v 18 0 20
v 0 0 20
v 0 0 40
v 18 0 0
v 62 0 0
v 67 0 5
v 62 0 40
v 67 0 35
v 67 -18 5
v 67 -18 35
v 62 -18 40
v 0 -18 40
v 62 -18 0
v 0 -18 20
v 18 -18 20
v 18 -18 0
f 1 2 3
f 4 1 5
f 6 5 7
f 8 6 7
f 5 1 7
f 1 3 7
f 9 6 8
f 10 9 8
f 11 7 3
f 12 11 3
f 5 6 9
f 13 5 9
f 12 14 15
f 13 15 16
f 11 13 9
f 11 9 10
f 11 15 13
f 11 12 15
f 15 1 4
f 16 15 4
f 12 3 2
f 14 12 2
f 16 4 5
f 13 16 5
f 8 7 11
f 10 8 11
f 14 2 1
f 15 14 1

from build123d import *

# Parameters (mm, degrees)
F1_DEPTH = 18
F2_SIZE  = 5


with BuildPart() as f1:
    # F0 (on Front) → F1 (new body)
    with BuildSketch(Plane.XZ):
        Polygon((18, 20), (18, 0), (67, 0), (67, 40), (0, 40), (0, 20), align=None)
    extrude(amount=F1_DEPTH)

    # F2
    f2_edges = [f1.edges().sort_by_distance(p)[0] for p in [
        (67, -9, 40),
        (67, -9, 0),
    ]]
    chamfer(f2_edges, length=F2_SIZE)


solid = f1.part
